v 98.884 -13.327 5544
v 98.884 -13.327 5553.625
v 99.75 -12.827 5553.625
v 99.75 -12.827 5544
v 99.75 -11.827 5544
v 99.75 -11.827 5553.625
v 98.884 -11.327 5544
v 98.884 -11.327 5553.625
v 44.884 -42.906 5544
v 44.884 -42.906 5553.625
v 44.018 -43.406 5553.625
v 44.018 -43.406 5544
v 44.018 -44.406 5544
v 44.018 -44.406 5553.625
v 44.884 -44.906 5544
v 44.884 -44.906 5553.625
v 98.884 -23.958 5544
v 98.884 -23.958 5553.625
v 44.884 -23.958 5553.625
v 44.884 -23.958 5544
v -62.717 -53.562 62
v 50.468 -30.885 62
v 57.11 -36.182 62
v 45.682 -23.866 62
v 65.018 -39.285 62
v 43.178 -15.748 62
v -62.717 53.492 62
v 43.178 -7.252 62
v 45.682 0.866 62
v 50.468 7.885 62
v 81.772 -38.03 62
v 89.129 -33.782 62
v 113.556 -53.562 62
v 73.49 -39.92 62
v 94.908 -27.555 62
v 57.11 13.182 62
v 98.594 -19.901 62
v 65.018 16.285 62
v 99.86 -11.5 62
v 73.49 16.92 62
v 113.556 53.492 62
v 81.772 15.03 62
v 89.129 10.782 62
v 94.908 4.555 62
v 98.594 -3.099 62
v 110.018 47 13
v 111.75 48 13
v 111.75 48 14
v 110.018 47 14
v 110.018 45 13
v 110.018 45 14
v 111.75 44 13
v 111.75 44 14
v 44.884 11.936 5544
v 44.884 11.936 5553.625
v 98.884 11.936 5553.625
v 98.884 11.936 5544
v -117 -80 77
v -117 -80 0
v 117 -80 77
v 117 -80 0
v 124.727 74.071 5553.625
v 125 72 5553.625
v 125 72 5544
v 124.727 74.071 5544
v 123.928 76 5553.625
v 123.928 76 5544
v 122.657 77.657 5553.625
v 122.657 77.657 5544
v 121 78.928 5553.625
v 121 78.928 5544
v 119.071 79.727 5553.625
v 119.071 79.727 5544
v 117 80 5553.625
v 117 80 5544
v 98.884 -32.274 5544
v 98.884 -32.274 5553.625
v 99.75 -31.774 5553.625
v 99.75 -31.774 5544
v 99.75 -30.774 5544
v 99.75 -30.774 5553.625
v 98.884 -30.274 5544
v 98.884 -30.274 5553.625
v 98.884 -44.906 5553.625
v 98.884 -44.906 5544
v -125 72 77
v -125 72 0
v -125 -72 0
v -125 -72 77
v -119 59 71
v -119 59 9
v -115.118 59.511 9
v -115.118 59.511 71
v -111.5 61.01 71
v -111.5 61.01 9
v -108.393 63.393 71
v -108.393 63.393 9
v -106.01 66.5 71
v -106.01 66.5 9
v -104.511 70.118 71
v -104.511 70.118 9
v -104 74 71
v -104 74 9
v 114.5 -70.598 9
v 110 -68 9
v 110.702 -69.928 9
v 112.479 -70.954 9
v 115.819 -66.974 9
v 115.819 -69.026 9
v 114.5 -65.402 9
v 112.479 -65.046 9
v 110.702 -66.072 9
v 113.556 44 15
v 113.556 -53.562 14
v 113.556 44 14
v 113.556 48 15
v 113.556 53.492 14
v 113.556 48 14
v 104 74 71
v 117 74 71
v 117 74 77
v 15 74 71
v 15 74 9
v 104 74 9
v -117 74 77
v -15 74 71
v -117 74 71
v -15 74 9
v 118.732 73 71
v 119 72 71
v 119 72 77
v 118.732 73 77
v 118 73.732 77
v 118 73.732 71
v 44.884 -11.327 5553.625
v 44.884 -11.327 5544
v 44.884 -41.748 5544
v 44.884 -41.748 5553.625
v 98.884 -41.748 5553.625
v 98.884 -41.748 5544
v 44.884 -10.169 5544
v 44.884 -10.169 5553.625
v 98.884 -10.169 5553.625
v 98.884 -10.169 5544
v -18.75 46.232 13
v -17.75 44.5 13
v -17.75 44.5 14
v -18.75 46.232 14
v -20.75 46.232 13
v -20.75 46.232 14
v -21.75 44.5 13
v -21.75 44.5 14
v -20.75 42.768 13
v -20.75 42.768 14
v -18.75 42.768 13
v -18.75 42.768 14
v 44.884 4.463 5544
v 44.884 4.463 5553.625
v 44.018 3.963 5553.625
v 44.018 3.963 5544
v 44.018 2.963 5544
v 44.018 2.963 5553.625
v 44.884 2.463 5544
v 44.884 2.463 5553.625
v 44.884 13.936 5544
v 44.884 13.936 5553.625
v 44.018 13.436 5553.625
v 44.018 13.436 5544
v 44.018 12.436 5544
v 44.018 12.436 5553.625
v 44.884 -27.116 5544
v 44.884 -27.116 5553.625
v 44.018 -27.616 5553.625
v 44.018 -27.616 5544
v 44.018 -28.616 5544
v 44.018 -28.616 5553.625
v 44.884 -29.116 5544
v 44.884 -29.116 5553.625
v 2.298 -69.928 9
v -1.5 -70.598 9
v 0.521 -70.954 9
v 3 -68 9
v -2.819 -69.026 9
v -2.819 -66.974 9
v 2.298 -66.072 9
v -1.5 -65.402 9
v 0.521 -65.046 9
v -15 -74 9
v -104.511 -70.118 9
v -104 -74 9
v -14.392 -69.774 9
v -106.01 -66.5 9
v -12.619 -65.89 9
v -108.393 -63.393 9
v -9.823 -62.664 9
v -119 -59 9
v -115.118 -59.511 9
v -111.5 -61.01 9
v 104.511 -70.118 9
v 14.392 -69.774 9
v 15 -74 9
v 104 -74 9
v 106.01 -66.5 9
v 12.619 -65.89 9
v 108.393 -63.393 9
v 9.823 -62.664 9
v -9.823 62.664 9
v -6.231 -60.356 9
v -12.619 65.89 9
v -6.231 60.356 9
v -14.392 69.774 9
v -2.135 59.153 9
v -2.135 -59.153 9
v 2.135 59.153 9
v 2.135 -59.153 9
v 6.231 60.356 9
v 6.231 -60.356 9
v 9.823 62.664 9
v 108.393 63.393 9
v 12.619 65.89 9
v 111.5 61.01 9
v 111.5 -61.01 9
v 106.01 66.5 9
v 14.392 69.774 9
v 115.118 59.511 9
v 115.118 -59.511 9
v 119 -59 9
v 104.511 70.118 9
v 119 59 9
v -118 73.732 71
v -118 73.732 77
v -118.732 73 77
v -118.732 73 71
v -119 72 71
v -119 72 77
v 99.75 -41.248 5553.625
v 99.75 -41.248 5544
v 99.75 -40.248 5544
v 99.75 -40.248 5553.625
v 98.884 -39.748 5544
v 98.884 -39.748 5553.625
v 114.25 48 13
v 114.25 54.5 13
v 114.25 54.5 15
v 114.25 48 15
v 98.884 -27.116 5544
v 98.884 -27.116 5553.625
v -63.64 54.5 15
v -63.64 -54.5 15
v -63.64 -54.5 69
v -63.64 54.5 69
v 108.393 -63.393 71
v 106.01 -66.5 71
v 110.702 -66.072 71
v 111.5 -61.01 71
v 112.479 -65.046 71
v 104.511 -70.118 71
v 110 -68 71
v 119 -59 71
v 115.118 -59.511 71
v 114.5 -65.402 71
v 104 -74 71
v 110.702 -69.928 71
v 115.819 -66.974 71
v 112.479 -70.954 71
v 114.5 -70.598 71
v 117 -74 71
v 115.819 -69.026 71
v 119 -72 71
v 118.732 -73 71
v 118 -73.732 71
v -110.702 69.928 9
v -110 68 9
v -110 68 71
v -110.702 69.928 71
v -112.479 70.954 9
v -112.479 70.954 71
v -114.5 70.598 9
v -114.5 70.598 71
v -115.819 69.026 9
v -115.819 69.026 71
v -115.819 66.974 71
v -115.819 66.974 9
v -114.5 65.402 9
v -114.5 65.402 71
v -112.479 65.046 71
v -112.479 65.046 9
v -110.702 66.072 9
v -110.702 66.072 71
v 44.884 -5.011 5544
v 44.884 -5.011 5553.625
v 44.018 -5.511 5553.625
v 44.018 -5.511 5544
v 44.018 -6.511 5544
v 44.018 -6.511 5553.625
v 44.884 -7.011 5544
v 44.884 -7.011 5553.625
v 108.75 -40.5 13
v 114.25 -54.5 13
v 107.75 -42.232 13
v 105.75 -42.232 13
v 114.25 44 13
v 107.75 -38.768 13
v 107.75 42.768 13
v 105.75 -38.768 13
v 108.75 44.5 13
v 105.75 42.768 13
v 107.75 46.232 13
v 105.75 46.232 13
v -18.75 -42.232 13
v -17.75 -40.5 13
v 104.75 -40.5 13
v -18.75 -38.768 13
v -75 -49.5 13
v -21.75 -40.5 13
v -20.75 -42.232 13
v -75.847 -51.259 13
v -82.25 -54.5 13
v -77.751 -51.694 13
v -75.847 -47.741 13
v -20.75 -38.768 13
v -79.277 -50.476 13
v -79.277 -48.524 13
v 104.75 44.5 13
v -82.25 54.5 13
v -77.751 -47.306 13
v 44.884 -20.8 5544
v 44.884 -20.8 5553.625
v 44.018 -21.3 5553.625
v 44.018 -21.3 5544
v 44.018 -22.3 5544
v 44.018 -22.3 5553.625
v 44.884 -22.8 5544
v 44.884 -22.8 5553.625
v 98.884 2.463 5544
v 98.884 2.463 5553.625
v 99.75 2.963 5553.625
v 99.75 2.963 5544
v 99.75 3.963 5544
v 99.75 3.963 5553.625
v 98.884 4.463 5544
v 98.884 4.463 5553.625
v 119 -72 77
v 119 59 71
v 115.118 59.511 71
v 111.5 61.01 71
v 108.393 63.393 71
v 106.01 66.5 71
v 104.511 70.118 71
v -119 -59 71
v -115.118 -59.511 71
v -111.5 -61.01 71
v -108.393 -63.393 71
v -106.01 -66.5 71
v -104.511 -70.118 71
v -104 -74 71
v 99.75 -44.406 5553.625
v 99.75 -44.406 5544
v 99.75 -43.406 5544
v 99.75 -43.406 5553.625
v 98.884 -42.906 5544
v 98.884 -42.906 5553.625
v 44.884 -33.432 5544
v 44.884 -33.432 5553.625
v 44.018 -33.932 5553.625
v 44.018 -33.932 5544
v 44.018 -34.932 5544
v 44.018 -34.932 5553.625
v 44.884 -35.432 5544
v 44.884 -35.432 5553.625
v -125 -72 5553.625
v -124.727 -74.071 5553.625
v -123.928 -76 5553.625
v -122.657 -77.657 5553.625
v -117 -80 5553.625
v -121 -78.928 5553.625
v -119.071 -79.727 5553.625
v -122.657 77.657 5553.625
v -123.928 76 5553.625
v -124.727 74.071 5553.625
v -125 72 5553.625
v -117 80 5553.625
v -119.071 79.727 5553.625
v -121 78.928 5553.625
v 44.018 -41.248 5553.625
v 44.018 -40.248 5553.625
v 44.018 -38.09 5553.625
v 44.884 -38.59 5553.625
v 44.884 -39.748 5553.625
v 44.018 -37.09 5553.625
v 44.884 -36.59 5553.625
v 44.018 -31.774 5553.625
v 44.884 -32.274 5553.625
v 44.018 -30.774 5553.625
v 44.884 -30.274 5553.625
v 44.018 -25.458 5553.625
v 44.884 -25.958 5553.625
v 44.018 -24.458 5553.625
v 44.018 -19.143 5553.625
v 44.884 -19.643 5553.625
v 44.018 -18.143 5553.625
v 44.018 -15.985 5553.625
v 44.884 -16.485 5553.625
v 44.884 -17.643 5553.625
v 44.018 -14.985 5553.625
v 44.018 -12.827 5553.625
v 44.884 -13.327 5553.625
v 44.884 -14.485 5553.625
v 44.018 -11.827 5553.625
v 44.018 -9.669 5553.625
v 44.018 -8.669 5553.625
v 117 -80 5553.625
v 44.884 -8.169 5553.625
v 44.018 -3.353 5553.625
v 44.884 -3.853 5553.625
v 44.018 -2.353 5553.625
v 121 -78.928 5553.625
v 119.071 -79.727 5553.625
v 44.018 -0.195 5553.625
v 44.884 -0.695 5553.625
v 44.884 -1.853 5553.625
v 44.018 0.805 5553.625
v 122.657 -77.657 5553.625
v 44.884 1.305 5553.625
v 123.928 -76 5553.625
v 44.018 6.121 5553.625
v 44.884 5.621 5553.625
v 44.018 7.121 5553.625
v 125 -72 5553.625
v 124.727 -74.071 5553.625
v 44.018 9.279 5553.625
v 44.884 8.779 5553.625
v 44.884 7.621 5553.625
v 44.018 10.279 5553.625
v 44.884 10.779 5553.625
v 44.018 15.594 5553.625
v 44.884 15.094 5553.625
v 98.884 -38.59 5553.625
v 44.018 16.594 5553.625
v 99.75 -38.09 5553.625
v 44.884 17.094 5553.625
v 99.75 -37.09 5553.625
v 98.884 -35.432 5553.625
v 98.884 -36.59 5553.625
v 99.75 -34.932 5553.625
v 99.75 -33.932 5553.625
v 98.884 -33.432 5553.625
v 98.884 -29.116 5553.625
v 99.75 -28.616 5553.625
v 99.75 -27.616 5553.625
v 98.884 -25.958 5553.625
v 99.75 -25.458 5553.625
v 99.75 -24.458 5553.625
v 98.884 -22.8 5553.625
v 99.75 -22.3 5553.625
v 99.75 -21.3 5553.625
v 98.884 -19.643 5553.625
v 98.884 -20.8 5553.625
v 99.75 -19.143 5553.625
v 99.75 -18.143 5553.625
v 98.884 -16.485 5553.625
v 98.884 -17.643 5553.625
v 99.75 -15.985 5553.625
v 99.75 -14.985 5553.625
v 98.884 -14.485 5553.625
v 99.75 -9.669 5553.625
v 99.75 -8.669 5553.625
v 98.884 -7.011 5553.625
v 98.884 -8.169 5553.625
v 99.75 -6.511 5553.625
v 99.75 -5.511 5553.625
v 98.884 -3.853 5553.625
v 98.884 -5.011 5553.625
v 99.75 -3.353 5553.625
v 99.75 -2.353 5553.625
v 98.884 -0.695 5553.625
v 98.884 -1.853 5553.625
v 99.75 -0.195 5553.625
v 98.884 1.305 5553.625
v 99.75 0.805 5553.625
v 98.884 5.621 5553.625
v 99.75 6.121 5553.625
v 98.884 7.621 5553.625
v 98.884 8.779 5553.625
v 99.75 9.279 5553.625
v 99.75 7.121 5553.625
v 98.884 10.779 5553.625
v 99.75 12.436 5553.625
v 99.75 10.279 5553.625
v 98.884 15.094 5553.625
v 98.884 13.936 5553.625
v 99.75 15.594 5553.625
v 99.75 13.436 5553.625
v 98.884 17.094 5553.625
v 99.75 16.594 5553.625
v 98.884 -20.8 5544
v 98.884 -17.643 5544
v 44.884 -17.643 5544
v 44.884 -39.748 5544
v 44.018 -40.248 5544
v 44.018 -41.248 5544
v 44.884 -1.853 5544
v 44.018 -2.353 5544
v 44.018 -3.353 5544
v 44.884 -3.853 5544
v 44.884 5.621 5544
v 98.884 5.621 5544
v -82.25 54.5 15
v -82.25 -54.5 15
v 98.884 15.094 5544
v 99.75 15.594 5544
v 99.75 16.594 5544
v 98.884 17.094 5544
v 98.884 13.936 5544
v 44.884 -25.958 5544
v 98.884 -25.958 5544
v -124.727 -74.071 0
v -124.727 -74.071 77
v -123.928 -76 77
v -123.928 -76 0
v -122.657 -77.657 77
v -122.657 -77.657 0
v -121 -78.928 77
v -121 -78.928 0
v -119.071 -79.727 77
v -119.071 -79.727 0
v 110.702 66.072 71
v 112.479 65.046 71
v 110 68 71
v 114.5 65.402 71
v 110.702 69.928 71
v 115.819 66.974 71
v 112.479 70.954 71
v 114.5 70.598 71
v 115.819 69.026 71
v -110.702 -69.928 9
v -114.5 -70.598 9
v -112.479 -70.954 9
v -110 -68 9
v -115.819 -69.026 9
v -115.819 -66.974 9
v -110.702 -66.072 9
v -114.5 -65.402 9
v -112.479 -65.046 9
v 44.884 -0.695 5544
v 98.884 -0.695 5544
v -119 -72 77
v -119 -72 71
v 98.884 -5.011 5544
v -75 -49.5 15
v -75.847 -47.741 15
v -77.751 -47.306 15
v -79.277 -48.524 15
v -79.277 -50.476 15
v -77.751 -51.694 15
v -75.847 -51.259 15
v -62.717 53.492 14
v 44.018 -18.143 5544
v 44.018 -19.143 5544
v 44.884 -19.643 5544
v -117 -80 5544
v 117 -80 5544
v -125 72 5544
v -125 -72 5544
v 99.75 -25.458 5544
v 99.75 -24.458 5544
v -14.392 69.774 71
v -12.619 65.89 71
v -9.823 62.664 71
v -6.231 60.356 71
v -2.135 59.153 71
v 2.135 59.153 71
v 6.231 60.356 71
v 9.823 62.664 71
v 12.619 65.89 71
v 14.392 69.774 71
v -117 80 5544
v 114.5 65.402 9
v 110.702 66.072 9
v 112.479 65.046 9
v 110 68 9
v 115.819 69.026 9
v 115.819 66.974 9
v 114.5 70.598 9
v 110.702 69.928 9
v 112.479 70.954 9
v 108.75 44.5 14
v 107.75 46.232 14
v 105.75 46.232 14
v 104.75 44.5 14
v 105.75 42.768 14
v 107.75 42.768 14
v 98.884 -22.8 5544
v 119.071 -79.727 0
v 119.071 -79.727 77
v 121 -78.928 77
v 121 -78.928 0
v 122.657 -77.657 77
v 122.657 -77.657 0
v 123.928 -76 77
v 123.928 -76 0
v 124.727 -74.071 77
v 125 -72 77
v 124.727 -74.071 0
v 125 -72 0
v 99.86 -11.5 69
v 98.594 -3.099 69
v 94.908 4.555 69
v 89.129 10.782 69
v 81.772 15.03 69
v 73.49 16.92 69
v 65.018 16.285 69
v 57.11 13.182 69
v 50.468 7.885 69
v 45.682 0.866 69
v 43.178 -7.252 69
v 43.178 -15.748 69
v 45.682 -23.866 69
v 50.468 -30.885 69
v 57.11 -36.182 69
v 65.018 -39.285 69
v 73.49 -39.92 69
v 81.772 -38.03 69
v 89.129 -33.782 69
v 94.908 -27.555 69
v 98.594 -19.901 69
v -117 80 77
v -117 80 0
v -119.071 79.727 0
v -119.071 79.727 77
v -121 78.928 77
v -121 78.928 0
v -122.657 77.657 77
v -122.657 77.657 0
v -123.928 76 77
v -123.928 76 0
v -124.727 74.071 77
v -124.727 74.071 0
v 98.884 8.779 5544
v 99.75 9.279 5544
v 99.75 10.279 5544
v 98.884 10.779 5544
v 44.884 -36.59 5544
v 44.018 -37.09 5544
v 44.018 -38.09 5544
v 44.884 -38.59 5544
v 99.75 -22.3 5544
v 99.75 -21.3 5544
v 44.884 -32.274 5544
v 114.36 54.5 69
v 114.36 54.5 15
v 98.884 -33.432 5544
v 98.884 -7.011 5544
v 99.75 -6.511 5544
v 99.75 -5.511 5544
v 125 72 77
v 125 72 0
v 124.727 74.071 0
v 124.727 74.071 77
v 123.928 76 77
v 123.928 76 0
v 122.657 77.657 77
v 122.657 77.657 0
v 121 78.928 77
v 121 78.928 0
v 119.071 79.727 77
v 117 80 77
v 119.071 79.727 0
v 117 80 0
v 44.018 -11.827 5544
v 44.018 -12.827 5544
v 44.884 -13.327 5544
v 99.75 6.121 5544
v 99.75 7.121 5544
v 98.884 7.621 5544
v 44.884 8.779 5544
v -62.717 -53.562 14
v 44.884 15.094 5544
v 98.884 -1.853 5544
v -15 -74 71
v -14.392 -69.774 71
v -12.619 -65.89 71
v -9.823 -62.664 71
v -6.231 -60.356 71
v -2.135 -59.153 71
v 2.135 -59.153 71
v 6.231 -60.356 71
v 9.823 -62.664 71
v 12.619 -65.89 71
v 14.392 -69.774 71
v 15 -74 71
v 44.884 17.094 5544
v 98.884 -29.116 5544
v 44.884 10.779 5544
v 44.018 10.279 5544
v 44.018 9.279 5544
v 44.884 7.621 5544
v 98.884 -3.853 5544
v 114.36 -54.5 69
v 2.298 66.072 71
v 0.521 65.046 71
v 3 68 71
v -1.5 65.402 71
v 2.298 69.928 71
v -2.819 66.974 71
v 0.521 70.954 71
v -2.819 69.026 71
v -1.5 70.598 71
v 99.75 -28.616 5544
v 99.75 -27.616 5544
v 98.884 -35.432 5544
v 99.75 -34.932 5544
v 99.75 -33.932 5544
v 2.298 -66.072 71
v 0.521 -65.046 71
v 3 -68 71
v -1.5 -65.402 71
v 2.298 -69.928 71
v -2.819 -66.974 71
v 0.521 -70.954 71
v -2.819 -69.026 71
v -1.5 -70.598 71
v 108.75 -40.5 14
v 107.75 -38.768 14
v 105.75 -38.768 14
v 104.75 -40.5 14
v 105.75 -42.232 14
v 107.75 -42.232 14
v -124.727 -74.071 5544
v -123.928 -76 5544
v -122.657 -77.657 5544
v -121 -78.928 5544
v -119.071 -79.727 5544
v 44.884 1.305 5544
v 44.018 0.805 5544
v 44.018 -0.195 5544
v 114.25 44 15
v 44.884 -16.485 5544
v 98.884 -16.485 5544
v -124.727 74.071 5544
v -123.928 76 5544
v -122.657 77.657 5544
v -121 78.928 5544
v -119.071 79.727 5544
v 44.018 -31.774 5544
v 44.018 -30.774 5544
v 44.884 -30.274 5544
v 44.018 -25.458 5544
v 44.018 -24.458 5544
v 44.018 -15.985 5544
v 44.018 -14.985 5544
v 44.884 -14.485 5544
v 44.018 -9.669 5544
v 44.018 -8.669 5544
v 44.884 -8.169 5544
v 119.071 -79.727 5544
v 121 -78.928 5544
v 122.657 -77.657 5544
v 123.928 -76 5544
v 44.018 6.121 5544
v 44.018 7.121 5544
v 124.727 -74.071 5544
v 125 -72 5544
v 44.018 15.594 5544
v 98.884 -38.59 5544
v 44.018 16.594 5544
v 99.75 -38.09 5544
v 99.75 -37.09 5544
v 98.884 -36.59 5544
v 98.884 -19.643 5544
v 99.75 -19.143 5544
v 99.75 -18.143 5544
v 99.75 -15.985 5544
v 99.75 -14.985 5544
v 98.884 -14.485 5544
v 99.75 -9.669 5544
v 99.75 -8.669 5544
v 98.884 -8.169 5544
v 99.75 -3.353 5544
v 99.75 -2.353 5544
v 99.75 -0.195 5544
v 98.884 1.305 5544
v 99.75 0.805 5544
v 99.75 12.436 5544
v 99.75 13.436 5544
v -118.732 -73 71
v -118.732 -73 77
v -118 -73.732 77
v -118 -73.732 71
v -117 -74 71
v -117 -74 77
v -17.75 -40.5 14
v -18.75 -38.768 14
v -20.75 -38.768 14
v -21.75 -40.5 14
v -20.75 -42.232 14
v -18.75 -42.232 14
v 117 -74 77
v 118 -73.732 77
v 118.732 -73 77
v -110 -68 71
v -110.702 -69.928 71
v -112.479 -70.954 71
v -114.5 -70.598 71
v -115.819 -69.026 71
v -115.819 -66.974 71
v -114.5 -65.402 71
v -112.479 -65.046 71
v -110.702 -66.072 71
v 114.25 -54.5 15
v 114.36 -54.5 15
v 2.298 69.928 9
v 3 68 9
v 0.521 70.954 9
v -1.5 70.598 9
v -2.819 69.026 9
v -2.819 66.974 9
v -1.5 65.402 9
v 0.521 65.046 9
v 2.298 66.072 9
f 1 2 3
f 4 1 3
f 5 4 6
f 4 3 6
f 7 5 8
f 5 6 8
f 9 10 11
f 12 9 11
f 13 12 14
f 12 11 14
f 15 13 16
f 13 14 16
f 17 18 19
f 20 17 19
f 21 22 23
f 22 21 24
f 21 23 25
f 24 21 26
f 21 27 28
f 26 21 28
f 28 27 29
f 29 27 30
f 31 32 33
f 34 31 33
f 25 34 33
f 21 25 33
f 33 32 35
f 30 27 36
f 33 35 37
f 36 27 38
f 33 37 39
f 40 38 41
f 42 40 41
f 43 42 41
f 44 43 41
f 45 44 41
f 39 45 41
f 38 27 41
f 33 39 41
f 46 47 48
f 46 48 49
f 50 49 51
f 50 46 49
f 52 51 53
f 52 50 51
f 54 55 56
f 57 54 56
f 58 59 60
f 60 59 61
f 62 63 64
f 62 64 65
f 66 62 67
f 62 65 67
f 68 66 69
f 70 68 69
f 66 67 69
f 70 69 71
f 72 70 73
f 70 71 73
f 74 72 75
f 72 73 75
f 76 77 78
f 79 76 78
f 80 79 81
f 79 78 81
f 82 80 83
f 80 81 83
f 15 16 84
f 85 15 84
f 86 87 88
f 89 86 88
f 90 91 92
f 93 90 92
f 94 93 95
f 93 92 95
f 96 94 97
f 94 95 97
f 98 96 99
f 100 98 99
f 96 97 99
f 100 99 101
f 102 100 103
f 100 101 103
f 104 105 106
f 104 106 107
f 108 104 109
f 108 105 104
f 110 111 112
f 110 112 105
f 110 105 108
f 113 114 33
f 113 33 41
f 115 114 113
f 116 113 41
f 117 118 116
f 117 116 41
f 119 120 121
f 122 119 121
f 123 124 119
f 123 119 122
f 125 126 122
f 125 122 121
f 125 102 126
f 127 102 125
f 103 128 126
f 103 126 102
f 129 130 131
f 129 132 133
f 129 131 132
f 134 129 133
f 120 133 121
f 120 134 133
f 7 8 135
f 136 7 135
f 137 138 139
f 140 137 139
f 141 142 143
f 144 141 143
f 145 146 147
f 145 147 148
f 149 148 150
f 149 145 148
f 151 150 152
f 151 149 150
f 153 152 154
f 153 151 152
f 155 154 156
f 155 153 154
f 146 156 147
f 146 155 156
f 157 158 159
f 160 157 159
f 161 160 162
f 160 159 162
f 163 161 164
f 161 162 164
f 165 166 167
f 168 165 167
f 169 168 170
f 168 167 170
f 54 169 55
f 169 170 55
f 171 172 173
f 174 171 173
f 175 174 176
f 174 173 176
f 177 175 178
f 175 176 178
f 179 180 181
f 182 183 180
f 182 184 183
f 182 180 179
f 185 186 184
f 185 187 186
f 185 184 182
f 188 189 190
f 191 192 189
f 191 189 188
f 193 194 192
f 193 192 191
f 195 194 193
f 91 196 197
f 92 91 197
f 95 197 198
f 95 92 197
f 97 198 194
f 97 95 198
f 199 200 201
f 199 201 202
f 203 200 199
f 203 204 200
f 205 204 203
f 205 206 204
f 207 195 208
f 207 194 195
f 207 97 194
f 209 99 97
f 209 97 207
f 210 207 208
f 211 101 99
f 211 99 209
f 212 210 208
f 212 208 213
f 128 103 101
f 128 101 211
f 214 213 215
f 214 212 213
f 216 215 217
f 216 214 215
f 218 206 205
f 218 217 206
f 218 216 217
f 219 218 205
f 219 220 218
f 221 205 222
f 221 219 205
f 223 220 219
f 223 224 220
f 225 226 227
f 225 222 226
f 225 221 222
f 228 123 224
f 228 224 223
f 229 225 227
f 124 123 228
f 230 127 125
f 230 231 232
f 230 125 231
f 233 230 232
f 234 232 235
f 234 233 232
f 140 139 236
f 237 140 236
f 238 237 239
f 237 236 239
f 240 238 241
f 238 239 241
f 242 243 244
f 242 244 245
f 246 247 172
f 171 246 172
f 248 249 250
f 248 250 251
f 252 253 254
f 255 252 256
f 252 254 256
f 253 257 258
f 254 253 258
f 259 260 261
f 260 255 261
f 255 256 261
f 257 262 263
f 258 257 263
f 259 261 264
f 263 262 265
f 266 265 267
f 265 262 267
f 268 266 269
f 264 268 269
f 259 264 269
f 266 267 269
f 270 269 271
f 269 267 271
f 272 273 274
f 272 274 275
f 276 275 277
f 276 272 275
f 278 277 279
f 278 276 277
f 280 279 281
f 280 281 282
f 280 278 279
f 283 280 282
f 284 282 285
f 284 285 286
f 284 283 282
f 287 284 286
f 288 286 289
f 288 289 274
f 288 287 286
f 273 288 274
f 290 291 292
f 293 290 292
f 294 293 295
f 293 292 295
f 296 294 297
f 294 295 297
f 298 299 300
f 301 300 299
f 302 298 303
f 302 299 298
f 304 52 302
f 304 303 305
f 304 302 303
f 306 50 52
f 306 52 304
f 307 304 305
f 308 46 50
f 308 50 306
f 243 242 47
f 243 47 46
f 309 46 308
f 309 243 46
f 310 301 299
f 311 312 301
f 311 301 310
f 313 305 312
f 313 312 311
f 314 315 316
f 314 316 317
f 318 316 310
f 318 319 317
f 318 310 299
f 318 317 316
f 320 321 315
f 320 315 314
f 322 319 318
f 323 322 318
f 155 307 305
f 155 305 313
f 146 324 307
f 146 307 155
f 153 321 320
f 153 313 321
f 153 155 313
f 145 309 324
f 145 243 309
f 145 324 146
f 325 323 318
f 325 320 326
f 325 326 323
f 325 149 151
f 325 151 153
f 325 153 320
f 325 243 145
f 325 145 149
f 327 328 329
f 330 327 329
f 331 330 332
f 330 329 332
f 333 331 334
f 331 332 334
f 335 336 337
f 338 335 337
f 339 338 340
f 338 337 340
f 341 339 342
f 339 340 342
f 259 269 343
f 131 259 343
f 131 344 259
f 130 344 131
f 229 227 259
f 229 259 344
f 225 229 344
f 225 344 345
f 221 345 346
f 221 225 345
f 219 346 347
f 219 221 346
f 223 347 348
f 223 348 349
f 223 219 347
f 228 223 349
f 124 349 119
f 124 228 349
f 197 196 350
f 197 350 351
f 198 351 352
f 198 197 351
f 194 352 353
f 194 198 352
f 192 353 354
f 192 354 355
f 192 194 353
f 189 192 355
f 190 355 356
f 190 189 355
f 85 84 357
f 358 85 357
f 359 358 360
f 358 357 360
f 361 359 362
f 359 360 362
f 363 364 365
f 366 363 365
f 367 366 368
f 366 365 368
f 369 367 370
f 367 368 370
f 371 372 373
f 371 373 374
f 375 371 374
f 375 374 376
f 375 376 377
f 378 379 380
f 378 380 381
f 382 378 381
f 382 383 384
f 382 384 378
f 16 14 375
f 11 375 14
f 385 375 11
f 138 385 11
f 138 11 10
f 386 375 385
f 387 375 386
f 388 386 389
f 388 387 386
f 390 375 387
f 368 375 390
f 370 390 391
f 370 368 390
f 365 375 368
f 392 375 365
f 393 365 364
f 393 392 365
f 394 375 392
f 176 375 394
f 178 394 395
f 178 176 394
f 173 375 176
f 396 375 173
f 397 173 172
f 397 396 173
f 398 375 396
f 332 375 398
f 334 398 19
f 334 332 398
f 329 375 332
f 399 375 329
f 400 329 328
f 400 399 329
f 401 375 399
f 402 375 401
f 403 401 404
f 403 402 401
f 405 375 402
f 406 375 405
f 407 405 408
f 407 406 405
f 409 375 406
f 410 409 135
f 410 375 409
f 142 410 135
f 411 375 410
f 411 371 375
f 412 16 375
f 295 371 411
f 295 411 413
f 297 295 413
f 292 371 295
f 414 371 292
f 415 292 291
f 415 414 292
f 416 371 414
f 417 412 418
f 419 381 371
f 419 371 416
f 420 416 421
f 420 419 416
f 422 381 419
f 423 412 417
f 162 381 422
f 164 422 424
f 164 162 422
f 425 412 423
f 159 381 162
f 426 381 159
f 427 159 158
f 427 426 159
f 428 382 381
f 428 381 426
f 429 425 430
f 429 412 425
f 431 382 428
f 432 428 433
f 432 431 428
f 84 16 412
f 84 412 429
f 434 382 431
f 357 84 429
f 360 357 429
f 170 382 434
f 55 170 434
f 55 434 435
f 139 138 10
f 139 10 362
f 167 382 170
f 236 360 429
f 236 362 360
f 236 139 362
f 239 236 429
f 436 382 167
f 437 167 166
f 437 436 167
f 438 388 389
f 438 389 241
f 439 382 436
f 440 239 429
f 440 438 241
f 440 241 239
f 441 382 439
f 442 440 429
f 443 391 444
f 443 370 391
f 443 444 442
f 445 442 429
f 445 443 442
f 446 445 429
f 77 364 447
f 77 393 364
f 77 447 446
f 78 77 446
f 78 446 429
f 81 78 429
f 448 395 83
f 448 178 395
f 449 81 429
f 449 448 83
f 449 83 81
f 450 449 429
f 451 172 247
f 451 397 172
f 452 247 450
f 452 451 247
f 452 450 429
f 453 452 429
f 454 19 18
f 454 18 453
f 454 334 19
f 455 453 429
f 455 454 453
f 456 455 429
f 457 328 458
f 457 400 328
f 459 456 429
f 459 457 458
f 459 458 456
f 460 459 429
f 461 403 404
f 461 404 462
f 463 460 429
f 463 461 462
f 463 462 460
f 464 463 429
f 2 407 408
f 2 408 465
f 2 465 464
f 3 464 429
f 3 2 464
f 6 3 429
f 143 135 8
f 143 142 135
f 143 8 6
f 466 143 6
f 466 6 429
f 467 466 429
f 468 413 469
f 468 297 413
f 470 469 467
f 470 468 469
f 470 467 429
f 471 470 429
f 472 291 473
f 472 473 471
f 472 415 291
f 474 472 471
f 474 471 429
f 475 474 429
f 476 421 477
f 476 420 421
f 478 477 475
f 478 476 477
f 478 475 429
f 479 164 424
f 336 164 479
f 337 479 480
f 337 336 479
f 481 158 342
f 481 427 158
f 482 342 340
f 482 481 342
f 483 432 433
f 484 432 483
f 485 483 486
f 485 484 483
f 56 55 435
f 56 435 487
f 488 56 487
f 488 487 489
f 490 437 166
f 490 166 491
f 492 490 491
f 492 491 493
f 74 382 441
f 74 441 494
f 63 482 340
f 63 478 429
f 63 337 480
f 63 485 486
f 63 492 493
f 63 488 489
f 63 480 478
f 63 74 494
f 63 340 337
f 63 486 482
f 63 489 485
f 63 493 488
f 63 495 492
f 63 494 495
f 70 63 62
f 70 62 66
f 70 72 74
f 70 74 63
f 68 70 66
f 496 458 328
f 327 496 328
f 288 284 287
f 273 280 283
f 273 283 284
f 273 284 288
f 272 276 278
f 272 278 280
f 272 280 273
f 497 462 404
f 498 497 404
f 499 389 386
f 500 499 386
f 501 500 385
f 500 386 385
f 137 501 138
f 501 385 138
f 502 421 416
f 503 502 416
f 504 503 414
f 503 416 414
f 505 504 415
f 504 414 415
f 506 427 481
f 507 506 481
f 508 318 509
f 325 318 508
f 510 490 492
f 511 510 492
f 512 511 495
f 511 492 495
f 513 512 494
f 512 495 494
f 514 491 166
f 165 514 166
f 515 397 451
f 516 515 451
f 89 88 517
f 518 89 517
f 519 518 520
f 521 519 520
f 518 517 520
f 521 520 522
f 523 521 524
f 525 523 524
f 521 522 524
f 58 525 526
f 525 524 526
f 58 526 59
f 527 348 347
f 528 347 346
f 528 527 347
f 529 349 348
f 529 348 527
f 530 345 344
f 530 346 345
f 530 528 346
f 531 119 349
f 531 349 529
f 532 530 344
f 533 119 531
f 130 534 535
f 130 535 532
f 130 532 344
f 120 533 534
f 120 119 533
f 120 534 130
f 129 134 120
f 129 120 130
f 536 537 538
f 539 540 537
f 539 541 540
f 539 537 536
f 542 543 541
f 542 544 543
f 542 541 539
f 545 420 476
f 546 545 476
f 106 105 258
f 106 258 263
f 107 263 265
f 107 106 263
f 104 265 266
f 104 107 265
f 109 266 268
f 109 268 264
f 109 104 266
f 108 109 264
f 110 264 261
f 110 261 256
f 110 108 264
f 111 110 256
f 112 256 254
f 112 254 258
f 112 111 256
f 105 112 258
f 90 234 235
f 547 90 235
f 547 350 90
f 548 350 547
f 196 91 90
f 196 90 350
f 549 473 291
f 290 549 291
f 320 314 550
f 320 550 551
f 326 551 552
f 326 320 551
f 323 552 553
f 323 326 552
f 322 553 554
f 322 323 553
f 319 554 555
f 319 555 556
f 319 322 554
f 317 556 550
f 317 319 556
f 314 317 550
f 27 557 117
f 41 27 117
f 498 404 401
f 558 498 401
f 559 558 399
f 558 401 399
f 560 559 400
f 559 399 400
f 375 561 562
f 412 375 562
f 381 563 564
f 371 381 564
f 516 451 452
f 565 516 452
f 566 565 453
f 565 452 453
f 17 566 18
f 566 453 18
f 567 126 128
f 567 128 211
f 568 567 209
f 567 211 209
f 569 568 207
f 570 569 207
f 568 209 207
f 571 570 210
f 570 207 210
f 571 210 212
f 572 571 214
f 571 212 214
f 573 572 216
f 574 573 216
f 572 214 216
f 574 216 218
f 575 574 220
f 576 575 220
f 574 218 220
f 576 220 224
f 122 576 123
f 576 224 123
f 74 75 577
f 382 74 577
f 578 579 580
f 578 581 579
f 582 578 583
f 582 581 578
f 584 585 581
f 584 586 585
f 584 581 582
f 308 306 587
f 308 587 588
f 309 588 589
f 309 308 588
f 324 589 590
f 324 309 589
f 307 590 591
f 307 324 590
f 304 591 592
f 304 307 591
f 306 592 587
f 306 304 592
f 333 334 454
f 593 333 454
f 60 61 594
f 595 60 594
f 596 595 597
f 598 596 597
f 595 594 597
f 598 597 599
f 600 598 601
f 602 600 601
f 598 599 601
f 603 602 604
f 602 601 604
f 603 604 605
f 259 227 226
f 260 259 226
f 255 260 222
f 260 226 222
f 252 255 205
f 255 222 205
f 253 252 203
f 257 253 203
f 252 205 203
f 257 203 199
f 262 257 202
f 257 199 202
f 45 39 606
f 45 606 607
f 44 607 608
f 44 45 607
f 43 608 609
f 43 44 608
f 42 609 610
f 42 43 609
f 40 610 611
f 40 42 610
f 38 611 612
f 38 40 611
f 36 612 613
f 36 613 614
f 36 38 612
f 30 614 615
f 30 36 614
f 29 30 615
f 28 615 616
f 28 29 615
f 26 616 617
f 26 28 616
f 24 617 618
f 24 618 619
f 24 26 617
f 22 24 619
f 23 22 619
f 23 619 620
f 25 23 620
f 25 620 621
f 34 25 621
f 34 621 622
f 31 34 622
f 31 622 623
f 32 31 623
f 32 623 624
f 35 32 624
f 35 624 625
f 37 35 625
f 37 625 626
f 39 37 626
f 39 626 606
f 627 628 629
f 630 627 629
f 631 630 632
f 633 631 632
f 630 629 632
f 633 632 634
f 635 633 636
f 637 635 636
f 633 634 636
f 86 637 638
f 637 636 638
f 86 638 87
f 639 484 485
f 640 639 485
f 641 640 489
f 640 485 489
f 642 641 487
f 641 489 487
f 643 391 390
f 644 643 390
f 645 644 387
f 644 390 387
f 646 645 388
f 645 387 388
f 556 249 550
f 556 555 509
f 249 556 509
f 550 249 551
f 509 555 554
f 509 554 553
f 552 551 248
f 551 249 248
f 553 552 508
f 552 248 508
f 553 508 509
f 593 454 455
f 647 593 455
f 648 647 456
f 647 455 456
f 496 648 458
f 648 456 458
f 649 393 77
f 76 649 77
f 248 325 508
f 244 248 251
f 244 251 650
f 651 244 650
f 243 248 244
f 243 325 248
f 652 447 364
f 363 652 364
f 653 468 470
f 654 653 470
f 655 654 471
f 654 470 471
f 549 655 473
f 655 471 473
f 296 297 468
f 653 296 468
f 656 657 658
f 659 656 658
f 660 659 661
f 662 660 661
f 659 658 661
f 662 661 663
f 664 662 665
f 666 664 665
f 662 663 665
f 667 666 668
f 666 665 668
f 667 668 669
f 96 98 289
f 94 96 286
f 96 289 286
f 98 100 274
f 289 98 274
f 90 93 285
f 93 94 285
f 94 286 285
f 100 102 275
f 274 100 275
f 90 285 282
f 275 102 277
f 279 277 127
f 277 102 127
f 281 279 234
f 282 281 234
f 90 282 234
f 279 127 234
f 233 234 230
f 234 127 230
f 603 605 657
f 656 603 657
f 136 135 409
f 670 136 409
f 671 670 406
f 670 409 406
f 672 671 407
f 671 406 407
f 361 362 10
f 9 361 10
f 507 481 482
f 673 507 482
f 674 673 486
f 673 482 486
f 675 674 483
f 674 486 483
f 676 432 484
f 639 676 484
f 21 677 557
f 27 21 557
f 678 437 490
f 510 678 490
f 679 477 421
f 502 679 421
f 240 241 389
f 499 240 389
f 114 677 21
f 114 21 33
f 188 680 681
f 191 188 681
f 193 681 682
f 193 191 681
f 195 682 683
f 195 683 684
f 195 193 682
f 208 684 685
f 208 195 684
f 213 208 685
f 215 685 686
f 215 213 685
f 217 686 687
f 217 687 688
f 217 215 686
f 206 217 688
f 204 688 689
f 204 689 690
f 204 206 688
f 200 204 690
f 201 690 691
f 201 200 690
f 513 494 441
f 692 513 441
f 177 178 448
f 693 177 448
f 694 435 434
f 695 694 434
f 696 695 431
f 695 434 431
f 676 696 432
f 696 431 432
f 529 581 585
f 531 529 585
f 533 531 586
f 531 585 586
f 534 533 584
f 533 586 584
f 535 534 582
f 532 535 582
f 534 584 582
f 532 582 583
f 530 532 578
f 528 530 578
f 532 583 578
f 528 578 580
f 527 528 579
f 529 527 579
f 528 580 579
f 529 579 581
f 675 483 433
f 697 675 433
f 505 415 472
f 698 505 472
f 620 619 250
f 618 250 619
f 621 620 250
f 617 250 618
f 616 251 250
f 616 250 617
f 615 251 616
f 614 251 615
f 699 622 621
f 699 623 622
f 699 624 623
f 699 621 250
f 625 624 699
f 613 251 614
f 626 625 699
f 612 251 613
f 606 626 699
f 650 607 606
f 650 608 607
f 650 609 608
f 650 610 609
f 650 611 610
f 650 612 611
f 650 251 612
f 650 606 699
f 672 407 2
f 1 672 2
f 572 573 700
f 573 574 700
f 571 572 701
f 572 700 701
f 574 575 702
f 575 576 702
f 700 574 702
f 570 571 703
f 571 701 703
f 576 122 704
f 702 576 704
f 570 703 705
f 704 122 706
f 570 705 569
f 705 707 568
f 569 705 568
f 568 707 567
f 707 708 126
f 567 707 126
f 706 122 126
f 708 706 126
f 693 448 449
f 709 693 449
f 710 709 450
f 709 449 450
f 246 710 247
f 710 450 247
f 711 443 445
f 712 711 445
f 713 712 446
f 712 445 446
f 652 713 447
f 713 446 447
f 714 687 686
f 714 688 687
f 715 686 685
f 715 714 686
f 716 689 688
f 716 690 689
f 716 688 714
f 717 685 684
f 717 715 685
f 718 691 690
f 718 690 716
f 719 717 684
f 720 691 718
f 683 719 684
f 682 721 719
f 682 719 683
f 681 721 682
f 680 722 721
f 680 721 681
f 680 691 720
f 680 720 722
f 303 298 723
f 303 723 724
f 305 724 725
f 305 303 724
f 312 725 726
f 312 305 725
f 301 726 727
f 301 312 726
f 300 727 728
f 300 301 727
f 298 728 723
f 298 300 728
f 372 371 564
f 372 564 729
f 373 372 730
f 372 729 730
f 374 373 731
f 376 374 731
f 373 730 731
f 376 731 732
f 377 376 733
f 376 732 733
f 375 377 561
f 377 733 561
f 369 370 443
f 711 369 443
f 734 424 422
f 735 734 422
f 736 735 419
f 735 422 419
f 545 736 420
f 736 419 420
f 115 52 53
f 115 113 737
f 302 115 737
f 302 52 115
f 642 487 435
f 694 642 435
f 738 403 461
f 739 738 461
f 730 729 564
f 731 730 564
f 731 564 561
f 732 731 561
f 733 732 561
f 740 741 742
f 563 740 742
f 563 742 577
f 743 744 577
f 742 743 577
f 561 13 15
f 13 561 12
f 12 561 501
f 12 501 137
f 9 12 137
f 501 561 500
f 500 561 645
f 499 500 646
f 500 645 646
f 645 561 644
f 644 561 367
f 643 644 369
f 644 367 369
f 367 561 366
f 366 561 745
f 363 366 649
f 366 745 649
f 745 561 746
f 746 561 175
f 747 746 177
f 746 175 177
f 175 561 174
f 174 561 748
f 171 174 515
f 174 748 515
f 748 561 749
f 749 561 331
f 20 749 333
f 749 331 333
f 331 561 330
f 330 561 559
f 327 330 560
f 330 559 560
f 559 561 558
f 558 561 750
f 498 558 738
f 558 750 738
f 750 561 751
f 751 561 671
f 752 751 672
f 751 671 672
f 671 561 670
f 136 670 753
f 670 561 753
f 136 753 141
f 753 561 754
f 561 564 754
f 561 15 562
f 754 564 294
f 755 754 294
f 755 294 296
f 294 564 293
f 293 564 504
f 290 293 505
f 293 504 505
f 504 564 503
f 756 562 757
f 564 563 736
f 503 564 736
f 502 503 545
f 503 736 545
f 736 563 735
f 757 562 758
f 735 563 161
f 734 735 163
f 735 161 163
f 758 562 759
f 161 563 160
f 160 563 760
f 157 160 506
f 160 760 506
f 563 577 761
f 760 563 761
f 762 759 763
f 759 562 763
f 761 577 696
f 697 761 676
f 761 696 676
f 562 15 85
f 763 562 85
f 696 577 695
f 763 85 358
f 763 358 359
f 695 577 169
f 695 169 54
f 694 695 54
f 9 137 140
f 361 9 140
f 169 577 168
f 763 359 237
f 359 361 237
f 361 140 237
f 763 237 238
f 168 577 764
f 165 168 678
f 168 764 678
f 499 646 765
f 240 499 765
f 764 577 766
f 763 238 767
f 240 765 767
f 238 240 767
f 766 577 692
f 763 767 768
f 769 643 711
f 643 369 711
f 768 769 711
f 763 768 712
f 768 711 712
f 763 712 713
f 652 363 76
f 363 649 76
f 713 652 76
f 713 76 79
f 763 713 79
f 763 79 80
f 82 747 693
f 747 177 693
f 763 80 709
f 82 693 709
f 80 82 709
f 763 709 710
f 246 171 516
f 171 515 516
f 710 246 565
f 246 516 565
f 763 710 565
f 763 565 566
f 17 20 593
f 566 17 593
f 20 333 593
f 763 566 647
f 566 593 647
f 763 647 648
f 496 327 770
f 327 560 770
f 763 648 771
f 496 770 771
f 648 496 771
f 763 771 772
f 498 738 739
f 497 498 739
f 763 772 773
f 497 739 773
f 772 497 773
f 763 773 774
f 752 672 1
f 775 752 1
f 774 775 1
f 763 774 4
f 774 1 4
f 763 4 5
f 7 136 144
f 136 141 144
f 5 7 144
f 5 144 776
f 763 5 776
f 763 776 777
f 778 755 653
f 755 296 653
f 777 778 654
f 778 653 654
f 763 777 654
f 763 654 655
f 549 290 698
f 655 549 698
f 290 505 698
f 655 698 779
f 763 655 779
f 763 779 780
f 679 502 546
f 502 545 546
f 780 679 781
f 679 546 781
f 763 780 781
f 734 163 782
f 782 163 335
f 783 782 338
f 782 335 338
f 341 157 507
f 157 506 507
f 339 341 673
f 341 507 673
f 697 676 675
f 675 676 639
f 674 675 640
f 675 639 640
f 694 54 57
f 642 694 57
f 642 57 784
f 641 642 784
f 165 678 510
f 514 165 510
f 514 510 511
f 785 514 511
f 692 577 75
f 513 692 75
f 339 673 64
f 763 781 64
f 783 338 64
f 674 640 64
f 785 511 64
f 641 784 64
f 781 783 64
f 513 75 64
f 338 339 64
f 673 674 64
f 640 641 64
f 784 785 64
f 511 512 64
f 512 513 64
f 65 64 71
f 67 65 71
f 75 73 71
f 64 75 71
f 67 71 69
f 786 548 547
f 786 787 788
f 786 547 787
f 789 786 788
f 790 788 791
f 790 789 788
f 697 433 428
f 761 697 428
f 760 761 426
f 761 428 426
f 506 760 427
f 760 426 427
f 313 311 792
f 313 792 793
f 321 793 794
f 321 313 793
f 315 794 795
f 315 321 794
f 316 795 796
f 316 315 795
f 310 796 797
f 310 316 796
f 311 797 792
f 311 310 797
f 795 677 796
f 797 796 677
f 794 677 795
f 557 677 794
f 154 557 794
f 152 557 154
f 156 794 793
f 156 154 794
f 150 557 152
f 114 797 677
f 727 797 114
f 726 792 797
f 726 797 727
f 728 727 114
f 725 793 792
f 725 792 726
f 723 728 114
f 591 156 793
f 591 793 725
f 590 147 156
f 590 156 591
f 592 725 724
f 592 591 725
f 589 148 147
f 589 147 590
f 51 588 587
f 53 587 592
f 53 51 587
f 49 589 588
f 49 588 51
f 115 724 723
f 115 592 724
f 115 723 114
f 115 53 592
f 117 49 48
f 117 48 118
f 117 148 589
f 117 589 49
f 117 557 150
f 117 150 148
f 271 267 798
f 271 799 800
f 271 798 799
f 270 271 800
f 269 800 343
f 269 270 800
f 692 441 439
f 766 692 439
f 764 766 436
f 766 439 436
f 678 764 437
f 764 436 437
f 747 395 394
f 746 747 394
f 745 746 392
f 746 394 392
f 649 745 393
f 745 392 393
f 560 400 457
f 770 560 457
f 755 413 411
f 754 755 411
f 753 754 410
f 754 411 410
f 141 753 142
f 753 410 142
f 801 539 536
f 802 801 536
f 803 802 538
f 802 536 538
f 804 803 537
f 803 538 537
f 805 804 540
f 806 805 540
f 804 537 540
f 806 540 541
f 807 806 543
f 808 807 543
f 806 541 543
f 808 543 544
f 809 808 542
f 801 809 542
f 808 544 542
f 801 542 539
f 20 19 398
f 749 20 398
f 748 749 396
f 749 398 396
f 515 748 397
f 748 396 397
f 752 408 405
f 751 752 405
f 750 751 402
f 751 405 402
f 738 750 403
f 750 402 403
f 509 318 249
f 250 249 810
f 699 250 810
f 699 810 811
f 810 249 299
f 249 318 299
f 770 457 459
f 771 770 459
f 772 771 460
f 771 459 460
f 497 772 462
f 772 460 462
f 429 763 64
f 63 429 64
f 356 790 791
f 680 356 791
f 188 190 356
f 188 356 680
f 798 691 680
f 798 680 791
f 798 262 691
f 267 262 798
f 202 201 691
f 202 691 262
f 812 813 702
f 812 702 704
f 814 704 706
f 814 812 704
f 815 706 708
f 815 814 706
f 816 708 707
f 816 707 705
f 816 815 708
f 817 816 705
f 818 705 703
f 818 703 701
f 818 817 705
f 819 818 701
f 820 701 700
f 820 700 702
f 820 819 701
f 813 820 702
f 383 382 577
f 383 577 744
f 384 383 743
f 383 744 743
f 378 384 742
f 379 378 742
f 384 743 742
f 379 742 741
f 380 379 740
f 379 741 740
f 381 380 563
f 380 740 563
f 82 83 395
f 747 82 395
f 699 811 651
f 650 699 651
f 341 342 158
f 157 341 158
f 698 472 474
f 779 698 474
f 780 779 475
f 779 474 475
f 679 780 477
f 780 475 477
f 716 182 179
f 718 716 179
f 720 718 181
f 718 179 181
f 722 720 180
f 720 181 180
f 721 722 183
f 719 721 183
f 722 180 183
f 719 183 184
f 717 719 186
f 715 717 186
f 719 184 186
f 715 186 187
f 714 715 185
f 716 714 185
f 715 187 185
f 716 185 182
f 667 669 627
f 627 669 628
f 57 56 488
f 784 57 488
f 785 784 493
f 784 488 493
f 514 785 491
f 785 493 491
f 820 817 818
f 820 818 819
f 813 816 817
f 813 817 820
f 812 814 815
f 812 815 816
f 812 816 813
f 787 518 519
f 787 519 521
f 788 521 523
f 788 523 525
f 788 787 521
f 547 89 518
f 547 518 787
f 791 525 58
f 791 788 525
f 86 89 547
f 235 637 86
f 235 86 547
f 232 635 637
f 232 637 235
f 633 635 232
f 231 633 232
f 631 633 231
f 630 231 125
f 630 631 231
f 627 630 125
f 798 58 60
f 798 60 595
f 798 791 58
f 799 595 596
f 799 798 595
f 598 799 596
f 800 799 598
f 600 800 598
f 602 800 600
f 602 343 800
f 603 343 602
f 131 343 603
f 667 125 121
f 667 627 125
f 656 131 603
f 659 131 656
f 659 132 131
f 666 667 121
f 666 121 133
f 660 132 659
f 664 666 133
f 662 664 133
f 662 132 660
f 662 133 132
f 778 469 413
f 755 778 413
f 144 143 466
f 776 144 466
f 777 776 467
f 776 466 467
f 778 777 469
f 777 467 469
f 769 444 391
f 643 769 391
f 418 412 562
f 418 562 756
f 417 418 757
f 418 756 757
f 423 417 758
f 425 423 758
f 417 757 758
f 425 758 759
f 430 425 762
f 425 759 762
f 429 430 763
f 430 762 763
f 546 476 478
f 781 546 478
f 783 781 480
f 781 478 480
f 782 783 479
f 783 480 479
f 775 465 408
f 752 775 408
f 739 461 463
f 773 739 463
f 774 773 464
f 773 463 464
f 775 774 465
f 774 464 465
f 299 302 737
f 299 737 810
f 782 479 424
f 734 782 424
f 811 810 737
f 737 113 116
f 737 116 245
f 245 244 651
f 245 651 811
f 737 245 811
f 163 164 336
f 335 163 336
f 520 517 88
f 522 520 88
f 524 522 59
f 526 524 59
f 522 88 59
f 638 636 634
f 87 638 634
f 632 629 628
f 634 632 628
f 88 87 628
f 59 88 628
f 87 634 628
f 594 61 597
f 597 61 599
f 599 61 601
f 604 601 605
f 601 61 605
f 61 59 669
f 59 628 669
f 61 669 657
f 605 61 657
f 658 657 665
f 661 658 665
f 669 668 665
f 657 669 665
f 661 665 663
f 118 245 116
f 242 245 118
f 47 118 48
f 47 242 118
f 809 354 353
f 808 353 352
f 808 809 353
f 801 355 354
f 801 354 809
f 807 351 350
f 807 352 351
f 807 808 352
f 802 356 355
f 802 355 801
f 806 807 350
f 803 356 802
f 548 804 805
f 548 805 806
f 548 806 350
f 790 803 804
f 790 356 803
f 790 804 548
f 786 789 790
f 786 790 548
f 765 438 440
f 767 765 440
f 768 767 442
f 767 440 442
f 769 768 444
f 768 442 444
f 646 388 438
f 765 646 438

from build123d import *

# Parameters (mm, degrees)
PAD_DEPTH               = 77
POCKET_DEPTH            = 68.001
SKETCH002_R             = 3
PAD001_DEPTH            = 62
SKETCH002_MIRRORED_2_R  = 3
PAD001_MIRRORED_2_DEPTH = 62
SKETCH004_R             = 3
PAD002_DEPTH            = 62
SKETCH005_R             = 2.25
SKETCH005_R_2           = 2
PAD003_DEPTH            = 2
SKETCH007_W             = 178
SKETCH007_H             = 109
SKETCH007_R             = 28.5
PAD005_DEPTH            = 54
SKETCH008_W             = 176.272423
SKETCH008_H             = 107.053562
POCKET001_DEPTH         = 48
PAD004_DEPTH            = 9.625
POCKET002_DEPTH         = 9.625
LINEARPATTERN_COUNT     = 20
LINEARPATTERN_PITCH     = 3.157895


with BuildPart() as body:
    # Sketch → Pad (new body)
    with BuildSketch(Plane.XY):
        with BuildLine():
            Line((125, -72), (125, 72))
            ThreePointArc((125, 72), (122.656854, 77.656854), (117, 80))
            Line((117, 80), (-117, 80))
            ThreePointArc((-117, 80), (-122.656854, 77.656854), (-125, 72))
            Line((-125, 72), (-125, -72))
            ThreePointArc((-125, -72), (-122.656854, -77.656854), (-117, -80))
            Line((-117, -80), (117, -80))
            ThreePointArc((117, -80), (122.656854, -77.656854), (125, -72))
        make_face()
    extrude(amount=PAD_DEPTH)

    # Sketch001 → Pocket (cut, through all)
    with BuildSketch(Plane.XY.offset(9)):
        with BuildLine():
            Line((119, -72), (119, 72))
            ThreePointArc((119, 72), (118.414214, 73.414214), (117, 74))
            Line((117, 74), (-117, 74))
            ThreePointArc((-117, 74), (-118.414214, 73.414214), (-119, 72))
            Line((-119, 72), (-119, -72))
            ThreePointArc((-119, -72), (-118.414214, -73.414214), (-117, -74))
            Line((-117, -74), (117, -74))
            ThreePointArc((117, -74), (118.414214, -73.414214), (119, -72))
        make_face()
    extrude(amount=POCKET_DEPTH, mode=Mode.SUBTRACT)

    # Sketch002 → Pad001 (join)
    with BuildSketch(Plane.XY.offset(9)):
        with BuildLine():
            Line((-119, 74), (-104, 74))
            ThreePointArc((-119, 59), (-108.393398, 63.393398), (-104, 74))
            Line((-119, 74), (-119, 59))
        make_face()
        with Locations((-113, 68)):
            Circle(SKETCH002_R, mode=Mode.SUBTRACT)
    pad001 = extrude(amount=PAD001_DEPTH)

    # Sketch002 Mirrored 2 → Pad001 Mirrored 2 (add)
    with BuildSketch(Plane(origin=(0, 0, 9), x_dir=(-1, 0, 0), z_dir=(0, 0, -1))):
        with BuildLine():
            Line((-119, 74), (-104, 74))
            ThreePointArc((-119, 59), (-108.393398, 63.393398), (-104, 74))
            Line((-119, 74), (-119, 59))
        make_face()
        with Locations((-113, 68)):
            Circle(SKETCH002_MIRRORED_2_R, mode=Mode.SUBTRACT)
    pad001_mirrored_2 = extrude(amount=-PAD001_MIRRORED_2_DEPTH)

    # Mirrored001: Pad001, Pad001 Mirrored 2 across Sketch002 H_Axis
    add(pad001.mirror(Plane(origin=(0, 0, 9), x_dir=(0, 0, 1), z_dir=(0, 1, 0))))
    add(pad001_mirrored_2.mirror(Plane(origin=(0, 0, 9), x_dir=(0, 0, 1), z_dir=(0, 1, 0))))

    # Sketch004 → Pad002 (join)
    with BuildSketch(Plane.XY.offset(9)):
        with BuildLine():
            Line((-15, 74), (15, 74))
            ThreePointArc((-15, 74), (0, 59), (15, 74))
        make_face()
        with Locations((0, 68)):
            Circle(SKETCH004_R, mode=Mode.SUBTRACT)
    pad002 = extrude(amount=PAD002_DEPTH)

    # Mirrored002: Pad002 across XZ
    add(pad002.mirror(Plane.XZ))


with BuildPart() as body001:
    # Sketch005 → Pad003 (new body)
    with BuildSketch(Plane.XY.offset(13)):
        with BuildLine():
            Line((-98.25, -54.5), (-98.25, 54.5))
            Line((-98.25, 54.5), (98.25, 54.5))
            Line((98.25, 54.5), (98.25, 48))
            Line((98.25, 48), (95.75, 48))
            ThreePointArc((95.75, 48), (93.75, 46), (95.75, 44))
            Line((95.75, 44), (98.25, 44))
            Line((98.25, 44), (98.25, -54.5))
            Line((98.25, -54.5), (-98.25, -54.5))
        make_face()
        with Locations((-93.25, -49.5)):
            Circle(SKETCH005_R, mode=Mode.SUBTRACT)
        with Locations((-35.75, 44.5)):
            Circle(SKETCH005_R_2, mode=Mode.SUBTRACT)
        with Locations((90.75, 44.5)):
            Circle(SKETCH005_R_2, mode=Mode.SUBTRACT)
        with Locations((90.75, -40.5)):
            Circle(SKETCH005_R_2, mode=Mode.SUBTRACT)
        with Locations((-35.75, -40.5)):
            Circle(SKETCH005_R_2, mode=Mode.SUBTRACT)
    extrude(amount=PAD003_DEPTH)

    # Sketch007 (on Face15 of Pad003) → Pad005 (join)
    with BuildSketch(Plane.XY.offset(15)):
        with Locations((9.36, 0)):
            Rectangle(SKETCH007_W, SKETCH007_H)
        with Locations((55.36, -11.5)):
            Circle(SKETCH007_R, mode=Mode.SUBTRACT)
    extrude(amount=PAD005_DEPTH)

    # Sketch008 (on Face5 of Pad005) → Pocket001 (cut)
    with BuildSketch(Plane.XY.offset(14)):
        with Locations((9.419559, -0.035154)):
            Rectangle(SKETCH008_W, SKETCH008_H)
    extrude(amount=POCKET001_DEPTH, mode=Mode.SUBTRACT)


with BuildPart() as body001_1:
    # Body001 placement: moved
    add(body001.part.moved(Location((16, 0, 0))))


with BuildPart() as body002:
    # Sketch006 (on Sketch) → Pad004 (new body)
    with BuildSketch(Plane.XY.offset(5544)):
        with BuildLine():
            Line((125, -72), (125, 72))
            ThreePointArc((125, 72), (122.656854, 77.656854), (117, 80))
            Line((117, 80), (-117, 80))
            ThreePointArc((-117, 80), (-122.656854, 77.656854), (-125, 72))
            Line((-125, 72), (-125, -72))
            ThreePointArc((-125, -72), (-122.656854, -77.656854), (-117, -80))
            Line((-117, -80), (117, -80))
            ThreePointArc((117, -80), (122.656854, -77.656854), (125, -72))
        make_face()
    extrude(amount=PAD004_DEPTH)

    # Sketch009 (on Face10 of Pad004) → Pocket002 (cut)
    with BuildSketch(Plane.XY.offset(5553.625)):
        with BuildLine():
            ThreePointArc((44.884094, 17.094302), (43.884094, 16.094302), (44.884094, 15.094302))
            Line((44.884094, 15.094302), (98.884094, 15.094302))
            ThreePointArc((98.884094, 15.094302), (99.884094, 16.094302), (98.884094, 17.094302))
            Line((98.884094, 17.094302), (44.884094, 17.094302))
        make_face()
    pocket002 = extrude(amount=-POCKET002_DEPTH, mode=Mode.SUBTRACT)

    # LinearPattern: Pocket002 ×20
    with Locations(*[(0, -i * LINEARPATTERN_PITCH, 0) for i in range(1, LINEARPATTERN_COUNT)]):
        add(pocket002, mode=Mode.SUBTRACT)


solid = Compound([body.part, body001_1.part, body002.part])
